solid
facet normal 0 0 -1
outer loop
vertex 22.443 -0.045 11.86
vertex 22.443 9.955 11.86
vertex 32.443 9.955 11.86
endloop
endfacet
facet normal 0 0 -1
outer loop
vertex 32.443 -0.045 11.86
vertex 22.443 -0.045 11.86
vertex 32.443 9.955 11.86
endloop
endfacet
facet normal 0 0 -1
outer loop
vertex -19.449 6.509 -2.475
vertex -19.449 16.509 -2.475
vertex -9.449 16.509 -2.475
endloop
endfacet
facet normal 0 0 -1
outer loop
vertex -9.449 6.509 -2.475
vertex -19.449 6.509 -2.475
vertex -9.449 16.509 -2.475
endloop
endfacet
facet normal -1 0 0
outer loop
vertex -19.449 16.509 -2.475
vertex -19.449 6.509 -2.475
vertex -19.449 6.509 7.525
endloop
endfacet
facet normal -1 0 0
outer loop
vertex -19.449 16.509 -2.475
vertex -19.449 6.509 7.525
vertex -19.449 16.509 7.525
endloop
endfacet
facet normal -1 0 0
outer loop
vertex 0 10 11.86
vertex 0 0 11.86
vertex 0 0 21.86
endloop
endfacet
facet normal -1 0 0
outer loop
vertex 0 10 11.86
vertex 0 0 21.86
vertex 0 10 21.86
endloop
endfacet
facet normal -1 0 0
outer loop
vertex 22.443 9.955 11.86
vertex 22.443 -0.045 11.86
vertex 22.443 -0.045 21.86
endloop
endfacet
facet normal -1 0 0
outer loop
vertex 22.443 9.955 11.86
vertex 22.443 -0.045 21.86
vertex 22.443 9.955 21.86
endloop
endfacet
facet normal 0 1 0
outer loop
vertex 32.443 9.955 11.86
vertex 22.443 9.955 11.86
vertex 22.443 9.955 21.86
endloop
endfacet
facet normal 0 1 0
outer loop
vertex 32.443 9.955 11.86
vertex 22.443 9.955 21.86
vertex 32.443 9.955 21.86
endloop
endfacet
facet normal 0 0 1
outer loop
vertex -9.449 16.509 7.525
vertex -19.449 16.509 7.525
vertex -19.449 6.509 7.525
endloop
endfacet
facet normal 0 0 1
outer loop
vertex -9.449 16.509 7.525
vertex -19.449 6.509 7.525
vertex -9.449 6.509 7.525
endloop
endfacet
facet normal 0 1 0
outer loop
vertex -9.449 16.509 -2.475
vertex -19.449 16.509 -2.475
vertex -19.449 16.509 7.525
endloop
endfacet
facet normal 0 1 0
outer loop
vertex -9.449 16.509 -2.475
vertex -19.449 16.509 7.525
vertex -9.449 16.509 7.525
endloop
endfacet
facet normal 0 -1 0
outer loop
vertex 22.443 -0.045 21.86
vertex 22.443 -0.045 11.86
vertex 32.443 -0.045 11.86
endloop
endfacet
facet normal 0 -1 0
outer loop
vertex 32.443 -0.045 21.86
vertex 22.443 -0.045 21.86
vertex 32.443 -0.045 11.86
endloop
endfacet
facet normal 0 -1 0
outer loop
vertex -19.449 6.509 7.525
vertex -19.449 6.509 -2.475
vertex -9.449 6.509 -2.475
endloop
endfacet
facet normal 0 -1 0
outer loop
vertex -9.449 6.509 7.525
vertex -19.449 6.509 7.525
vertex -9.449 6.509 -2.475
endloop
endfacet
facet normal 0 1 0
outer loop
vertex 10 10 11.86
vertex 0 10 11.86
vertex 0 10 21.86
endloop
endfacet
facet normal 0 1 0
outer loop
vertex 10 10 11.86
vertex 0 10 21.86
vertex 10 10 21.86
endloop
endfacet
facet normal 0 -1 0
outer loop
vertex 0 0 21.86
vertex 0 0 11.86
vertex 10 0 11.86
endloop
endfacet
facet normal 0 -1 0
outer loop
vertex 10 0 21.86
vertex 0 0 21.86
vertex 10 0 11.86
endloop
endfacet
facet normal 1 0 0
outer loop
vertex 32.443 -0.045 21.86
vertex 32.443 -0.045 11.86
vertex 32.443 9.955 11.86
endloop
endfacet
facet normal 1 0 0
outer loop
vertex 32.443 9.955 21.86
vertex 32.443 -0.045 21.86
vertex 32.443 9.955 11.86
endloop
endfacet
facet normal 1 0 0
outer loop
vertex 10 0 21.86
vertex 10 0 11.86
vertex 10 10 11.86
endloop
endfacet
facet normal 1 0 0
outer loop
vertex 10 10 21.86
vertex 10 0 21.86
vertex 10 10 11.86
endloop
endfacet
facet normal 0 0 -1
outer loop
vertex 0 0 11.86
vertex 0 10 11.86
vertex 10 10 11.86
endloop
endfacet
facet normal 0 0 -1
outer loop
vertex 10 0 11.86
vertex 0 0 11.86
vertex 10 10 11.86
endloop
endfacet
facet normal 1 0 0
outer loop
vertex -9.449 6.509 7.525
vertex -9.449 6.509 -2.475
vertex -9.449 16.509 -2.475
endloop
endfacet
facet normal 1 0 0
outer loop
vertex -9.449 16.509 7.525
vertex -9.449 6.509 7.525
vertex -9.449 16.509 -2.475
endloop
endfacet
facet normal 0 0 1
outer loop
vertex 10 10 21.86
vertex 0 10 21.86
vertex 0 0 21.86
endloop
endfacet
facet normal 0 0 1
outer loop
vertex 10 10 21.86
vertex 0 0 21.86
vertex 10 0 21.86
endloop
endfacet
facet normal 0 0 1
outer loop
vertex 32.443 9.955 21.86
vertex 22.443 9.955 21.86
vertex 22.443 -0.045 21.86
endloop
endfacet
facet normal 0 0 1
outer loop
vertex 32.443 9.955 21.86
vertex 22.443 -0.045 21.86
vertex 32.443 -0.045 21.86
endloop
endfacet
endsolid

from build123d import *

# Parameters (mm, degrees)
BOX_W        = 10
BOX_H        = 10
BOX_DEPTH    = 10
BOX001_W     = 10
BOX001_H     = 10
BOX001_DEPTH = 10
BOX002_W     = 10
BOX002_H     = 10
BOX002_DEPTH = 10


with BuildPart() as cube:
    # Box → Box (new body)
    with BuildSketch(Plane(origin=(-19.449497, 6.509374, -2.474723), x_dir=(1, 0, 0), z_dir=(0, 0, 1))):
        with Locations((5, 5)):
            Rectangle(BOX_W, BOX_H)
    extrude(amount=BOX_DEPTH)


with BuildPart() as cube001:
    # Box001 → Box001 (new body)
    with BuildSketch(Plane(origin=(22.4429, -0.045339, 11.859516), x_dir=(1, 0, 0), z_dir=(0, 0, 1))):
        with Locations((5, 5)):
            Rectangle(BOX001_W, BOX001_H)
    extrude(amount=BOX001_DEPTH)


with BuildPart() as cube002:
    # Box002 → Box002 (new body)
    with BuildSketch(Plane.XY.offset(11.859516)):
        with Locations((5, 5)):
            Rectangle(BOX002_W, BOX002_H)
    extrude(amount=BOX002_DEPTH)


solid = Compound([cube.part, cube001.part, cube002.part])
